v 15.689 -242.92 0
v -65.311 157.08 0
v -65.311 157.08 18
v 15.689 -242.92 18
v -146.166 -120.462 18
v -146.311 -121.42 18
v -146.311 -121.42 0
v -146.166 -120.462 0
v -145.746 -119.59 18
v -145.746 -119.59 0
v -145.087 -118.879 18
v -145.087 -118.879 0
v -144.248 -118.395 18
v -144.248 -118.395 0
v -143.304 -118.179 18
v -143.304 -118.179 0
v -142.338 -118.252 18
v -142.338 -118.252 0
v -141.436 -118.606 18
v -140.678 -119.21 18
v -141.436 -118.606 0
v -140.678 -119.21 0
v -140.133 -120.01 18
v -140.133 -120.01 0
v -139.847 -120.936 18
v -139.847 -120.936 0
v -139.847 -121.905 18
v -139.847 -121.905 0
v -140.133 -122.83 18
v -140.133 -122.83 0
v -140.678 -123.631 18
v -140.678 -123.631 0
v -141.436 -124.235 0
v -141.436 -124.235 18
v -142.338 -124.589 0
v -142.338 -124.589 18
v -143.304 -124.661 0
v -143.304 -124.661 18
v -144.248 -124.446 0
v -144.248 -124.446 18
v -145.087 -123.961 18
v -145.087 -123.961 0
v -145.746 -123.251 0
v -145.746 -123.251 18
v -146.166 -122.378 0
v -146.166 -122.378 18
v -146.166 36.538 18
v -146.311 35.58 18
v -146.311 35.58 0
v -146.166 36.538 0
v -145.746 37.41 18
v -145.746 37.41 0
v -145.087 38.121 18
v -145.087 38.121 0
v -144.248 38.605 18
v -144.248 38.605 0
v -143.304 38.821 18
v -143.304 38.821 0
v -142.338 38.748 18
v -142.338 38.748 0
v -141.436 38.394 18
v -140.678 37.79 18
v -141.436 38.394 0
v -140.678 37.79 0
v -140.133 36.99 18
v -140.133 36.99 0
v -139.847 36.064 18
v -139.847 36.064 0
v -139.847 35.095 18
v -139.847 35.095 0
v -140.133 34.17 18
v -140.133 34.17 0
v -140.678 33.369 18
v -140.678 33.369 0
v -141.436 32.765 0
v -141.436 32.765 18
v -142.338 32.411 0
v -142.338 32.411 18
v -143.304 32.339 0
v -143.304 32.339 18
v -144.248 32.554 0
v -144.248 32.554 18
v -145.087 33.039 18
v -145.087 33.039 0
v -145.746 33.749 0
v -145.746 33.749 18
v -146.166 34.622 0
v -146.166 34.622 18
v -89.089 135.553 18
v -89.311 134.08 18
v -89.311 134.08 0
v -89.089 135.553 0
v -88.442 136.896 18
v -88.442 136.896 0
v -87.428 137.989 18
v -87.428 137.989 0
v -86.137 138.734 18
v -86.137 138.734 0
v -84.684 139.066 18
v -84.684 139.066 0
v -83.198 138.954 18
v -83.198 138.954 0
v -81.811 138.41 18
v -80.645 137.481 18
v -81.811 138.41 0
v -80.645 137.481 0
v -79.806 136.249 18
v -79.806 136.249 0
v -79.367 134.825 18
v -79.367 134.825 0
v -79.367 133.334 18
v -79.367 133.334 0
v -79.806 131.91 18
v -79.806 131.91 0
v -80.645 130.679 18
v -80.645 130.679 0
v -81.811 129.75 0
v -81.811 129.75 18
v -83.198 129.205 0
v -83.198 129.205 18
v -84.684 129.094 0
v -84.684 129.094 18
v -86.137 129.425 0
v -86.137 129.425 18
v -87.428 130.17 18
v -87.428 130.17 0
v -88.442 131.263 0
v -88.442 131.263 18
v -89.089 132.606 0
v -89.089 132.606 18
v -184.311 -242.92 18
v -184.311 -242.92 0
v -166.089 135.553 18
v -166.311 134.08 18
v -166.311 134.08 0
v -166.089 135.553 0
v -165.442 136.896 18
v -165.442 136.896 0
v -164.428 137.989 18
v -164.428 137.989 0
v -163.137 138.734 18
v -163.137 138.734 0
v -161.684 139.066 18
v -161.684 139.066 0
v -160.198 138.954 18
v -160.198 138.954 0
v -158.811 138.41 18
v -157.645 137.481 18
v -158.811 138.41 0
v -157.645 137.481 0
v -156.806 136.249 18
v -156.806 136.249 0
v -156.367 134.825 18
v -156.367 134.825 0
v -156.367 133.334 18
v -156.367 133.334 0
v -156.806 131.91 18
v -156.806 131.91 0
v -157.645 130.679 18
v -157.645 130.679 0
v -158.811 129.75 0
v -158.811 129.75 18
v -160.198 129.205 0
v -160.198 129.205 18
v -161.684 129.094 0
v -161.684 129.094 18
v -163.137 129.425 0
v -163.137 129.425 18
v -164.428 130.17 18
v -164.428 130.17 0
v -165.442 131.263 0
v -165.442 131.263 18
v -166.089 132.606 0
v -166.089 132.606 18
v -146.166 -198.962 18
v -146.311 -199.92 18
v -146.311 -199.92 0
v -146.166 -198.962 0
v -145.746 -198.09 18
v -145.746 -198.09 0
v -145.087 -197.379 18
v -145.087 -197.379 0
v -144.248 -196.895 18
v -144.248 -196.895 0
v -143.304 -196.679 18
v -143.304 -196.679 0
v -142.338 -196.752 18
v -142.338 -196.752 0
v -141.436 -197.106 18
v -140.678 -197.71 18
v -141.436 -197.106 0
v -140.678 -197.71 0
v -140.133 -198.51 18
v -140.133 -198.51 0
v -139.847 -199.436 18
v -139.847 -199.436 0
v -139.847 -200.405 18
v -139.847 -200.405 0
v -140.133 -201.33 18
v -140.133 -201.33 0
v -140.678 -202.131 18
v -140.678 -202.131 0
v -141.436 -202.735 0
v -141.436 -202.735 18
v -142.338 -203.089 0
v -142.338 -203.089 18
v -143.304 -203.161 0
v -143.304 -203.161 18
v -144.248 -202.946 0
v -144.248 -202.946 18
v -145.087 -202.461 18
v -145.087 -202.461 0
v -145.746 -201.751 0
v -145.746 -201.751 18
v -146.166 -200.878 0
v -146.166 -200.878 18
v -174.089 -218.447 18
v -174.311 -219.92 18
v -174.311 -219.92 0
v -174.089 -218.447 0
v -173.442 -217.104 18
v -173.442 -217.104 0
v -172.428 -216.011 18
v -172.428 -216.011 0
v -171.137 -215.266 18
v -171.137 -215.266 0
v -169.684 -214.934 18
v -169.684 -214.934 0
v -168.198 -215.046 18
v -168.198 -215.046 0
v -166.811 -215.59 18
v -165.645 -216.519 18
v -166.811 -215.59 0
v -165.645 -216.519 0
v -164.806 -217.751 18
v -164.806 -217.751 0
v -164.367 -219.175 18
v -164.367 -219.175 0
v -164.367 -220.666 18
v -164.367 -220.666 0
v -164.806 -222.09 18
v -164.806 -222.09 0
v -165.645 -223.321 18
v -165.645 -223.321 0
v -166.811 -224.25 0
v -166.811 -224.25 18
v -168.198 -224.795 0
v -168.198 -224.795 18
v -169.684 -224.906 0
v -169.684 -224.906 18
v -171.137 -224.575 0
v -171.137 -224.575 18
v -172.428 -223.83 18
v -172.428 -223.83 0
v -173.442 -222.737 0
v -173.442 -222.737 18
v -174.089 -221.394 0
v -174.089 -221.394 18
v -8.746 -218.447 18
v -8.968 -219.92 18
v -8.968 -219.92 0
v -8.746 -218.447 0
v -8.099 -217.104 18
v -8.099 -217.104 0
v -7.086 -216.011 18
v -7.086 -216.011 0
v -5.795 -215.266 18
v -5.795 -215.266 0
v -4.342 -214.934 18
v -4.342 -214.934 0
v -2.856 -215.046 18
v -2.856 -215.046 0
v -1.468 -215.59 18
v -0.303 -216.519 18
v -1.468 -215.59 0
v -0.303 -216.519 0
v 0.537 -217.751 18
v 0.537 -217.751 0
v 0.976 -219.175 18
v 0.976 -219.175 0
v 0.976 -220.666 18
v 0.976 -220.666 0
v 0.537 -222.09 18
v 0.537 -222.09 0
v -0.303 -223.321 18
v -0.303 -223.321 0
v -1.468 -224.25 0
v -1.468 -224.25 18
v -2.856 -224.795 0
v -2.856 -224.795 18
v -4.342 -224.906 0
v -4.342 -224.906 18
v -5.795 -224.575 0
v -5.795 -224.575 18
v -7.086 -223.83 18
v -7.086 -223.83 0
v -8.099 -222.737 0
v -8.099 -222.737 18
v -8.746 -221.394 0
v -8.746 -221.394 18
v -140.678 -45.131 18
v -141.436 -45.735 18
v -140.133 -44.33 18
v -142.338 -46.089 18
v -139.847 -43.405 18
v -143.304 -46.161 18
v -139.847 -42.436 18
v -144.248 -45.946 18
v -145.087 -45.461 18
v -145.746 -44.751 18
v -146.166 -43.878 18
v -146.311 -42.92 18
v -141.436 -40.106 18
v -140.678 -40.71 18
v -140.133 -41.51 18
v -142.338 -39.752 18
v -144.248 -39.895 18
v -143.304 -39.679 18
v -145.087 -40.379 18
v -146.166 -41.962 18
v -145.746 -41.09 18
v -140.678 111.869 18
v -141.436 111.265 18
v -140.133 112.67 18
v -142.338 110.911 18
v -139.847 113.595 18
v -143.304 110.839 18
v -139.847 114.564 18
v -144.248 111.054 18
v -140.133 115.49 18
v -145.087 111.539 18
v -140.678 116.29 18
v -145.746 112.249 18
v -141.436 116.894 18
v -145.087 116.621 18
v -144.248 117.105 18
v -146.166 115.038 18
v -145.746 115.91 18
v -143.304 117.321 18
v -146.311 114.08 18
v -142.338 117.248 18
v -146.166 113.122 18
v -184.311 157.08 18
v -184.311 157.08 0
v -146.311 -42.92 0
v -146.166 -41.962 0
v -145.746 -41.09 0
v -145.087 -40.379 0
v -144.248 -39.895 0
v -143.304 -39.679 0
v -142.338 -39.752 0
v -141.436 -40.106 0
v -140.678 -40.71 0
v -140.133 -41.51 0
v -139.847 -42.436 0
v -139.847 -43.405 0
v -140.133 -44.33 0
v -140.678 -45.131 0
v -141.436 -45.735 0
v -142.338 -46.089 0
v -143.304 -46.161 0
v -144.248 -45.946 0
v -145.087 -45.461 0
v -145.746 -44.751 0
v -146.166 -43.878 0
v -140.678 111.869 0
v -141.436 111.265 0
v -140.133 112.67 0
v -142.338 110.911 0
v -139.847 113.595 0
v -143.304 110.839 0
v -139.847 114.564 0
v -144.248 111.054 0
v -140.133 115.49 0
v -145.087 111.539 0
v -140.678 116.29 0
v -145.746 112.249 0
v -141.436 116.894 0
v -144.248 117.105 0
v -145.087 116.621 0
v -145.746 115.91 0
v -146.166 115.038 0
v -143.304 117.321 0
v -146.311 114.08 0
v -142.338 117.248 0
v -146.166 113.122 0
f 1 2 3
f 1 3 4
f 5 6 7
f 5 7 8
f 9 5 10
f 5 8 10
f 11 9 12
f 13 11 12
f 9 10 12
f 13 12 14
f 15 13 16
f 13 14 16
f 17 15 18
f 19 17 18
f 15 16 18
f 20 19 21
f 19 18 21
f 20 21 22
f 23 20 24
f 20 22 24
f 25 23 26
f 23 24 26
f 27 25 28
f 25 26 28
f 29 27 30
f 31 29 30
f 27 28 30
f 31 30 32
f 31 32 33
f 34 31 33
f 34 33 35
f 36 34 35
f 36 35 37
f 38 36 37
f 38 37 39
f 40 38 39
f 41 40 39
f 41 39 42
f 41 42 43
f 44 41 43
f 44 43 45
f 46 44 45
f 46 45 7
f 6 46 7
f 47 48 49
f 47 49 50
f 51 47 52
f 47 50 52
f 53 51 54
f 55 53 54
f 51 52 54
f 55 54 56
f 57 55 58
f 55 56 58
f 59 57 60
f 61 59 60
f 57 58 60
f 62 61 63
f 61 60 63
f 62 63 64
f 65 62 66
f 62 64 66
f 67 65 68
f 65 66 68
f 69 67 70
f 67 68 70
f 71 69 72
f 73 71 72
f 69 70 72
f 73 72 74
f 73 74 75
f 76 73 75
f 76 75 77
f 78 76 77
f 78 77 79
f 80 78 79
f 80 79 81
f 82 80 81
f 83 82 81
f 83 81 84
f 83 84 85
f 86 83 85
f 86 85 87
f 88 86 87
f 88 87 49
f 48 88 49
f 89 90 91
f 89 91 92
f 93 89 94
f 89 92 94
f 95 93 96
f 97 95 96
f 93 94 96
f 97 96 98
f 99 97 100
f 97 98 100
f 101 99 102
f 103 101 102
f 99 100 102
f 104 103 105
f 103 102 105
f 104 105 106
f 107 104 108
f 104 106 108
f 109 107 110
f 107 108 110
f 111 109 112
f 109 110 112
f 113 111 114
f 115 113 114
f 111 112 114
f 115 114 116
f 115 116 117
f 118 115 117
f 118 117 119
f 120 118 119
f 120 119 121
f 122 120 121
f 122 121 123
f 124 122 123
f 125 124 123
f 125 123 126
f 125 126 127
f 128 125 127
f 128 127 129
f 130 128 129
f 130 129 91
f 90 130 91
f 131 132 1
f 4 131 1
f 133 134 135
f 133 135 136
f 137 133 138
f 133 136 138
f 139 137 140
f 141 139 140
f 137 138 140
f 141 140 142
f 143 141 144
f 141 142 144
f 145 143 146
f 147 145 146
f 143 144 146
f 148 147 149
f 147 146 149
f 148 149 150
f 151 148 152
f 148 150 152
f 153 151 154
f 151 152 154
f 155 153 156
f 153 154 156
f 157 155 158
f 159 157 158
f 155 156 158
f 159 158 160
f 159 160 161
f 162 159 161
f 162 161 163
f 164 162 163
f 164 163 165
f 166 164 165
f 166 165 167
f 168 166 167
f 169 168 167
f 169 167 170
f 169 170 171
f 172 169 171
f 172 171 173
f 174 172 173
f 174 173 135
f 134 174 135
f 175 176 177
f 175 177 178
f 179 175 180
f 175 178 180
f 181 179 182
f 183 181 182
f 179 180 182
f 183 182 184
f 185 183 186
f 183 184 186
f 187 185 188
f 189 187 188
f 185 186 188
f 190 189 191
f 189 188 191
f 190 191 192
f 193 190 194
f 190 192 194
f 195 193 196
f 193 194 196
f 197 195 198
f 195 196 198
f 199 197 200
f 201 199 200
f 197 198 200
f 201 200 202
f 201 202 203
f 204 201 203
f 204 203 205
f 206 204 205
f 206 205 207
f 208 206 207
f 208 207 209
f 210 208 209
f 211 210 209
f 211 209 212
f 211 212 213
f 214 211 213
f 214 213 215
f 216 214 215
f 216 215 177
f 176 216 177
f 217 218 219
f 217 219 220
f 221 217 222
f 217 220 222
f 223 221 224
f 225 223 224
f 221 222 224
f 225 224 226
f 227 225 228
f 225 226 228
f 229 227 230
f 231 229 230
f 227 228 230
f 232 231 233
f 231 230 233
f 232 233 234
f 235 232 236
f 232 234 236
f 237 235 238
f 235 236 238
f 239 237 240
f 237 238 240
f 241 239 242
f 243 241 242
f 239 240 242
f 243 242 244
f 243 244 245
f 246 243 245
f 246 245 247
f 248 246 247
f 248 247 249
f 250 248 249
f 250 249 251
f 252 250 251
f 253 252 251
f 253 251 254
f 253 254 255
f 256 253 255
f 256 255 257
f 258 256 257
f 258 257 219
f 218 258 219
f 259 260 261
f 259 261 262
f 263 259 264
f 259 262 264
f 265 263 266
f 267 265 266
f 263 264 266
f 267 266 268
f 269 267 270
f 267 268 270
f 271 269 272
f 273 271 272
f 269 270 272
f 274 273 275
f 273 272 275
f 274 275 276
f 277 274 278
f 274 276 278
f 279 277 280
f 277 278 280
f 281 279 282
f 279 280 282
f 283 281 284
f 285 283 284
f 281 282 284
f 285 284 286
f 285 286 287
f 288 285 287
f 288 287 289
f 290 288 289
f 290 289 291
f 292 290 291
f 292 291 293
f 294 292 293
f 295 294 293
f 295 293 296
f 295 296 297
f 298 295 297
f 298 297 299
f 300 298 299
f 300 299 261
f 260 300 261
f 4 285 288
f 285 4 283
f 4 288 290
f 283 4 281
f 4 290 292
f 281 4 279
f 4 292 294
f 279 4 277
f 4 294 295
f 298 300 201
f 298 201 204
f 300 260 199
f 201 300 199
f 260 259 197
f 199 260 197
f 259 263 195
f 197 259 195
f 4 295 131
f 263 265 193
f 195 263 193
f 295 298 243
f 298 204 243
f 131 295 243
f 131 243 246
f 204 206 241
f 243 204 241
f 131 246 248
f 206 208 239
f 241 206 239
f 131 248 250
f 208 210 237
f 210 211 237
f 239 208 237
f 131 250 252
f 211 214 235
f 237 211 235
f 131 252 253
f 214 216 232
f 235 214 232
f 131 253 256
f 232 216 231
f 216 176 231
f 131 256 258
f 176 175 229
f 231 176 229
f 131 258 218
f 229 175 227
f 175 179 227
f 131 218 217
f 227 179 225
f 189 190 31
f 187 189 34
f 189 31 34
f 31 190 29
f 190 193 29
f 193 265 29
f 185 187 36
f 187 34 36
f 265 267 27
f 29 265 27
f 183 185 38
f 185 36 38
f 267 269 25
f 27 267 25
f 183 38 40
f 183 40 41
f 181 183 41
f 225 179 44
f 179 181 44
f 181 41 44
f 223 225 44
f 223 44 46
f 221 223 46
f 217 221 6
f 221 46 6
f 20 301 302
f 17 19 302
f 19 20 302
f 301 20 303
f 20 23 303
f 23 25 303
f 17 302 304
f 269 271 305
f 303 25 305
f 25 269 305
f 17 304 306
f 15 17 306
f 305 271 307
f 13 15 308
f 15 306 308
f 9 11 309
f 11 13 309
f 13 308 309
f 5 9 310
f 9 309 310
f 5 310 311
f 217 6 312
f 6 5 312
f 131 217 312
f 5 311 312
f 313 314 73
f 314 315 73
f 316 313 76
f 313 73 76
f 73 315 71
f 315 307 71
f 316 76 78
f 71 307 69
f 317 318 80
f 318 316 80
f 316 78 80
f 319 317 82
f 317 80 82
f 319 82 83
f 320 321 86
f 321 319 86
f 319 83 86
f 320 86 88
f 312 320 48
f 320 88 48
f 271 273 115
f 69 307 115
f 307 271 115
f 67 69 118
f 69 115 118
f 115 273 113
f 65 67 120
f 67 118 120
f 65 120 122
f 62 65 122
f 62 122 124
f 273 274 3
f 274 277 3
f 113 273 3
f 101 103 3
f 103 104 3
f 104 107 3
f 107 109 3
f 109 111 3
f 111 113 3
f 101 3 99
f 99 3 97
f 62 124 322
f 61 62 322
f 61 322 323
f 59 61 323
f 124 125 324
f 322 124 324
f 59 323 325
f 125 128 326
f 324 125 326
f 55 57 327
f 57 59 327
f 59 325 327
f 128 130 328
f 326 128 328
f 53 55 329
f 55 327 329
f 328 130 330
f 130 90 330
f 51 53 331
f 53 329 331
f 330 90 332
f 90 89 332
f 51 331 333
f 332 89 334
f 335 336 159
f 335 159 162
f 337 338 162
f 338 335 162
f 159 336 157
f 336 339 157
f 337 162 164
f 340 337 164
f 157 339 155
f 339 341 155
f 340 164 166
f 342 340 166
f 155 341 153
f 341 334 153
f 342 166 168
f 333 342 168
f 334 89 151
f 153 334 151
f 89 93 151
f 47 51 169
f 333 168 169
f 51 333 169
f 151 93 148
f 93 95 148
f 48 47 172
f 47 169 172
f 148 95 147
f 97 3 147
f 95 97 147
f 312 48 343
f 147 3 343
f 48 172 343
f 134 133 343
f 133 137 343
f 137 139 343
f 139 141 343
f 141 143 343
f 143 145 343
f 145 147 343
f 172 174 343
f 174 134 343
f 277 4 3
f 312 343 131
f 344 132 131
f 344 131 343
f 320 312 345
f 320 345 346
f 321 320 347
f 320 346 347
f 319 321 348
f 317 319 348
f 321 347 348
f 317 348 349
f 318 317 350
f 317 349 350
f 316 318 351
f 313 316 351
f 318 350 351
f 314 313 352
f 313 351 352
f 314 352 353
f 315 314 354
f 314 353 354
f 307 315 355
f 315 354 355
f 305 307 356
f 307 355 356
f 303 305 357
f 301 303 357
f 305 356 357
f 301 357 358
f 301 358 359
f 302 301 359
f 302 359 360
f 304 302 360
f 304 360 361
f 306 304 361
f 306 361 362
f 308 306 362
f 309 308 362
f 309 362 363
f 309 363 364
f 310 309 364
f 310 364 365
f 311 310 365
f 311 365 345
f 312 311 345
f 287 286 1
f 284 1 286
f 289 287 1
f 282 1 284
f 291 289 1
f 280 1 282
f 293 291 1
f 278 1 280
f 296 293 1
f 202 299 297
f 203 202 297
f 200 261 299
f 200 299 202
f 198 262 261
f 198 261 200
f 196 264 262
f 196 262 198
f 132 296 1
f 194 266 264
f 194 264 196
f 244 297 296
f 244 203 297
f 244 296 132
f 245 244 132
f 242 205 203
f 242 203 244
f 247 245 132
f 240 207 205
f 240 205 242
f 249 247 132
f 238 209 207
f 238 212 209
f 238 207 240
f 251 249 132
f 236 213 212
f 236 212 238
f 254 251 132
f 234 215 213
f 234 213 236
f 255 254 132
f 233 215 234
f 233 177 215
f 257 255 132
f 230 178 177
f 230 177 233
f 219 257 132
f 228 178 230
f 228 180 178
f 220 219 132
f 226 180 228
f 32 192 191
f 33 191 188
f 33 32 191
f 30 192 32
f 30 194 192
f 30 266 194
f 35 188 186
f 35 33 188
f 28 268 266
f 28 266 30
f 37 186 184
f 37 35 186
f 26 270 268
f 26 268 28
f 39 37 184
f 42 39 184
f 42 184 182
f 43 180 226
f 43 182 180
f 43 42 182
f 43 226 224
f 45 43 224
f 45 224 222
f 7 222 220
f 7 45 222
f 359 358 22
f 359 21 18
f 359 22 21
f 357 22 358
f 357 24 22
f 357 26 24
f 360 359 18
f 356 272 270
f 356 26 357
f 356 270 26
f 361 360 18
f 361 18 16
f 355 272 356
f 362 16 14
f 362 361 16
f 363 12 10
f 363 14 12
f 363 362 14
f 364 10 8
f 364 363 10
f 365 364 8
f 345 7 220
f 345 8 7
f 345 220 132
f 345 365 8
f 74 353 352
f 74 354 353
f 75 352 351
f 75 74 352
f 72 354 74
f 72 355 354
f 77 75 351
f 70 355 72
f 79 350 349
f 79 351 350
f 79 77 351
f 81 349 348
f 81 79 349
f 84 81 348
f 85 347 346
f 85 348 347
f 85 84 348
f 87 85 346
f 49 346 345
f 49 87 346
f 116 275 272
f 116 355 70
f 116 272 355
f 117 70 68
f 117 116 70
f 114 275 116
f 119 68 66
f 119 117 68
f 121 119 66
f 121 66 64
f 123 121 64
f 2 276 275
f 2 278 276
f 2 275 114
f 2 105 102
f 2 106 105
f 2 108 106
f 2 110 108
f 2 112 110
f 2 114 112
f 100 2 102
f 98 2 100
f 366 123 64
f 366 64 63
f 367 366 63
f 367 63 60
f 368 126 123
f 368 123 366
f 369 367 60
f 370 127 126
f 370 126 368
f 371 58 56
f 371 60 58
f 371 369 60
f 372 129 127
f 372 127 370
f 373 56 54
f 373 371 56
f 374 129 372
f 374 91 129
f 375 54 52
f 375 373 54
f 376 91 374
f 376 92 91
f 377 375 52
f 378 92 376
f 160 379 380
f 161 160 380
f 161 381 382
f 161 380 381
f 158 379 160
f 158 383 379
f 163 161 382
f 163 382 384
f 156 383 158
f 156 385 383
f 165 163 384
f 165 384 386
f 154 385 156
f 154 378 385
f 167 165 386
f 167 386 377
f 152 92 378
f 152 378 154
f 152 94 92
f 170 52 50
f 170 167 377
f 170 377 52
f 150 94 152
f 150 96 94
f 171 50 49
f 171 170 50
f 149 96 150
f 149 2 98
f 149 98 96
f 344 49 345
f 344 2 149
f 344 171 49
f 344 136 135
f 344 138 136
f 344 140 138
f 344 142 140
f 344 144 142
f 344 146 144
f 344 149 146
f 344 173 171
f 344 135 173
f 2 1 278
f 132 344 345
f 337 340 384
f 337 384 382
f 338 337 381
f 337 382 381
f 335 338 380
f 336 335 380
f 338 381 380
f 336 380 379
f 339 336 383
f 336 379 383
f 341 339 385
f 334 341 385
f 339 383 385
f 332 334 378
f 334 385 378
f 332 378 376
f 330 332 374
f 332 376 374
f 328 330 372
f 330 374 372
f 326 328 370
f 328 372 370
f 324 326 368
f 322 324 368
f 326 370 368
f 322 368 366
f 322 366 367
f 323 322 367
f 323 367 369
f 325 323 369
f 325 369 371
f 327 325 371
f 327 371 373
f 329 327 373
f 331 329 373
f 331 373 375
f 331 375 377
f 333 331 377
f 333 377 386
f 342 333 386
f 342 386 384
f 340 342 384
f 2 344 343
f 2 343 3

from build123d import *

# Parameters (mm, degrees)
BOSS_EXTRUDE1_DEPTH = 18
SKETCH2_R           = 5
SKETCH2_R_2         = 3.25
CUT_EXTRUDE1_DEPTH  = 19


with BuildPart() as part:
    # Sketch1 → Boss-Extrude1 (new body)
    with BuildSketch(Plane.XY):
        Polygon((-65.310735067, 157.079646018), (15.689264933, -242.920353982), (-65.310735067, -242.920353982), (-184.310735067, -242.920353982), (-184.310735067, 157.079646018), align=None)
    extrude(amount=BOSS_EXTRUDE1_DEPTH)

    # Sketch2 → Cut-Extrude1 (cut, through all)
    with BuildSketch(Plane(origin=(0, 0, 0), x_dir=(-1, 0, 0), z_dir=(0, 0, -1))):
        with Locations((84.310735067, 134.079646018)):
            Circle(SKETCH2_R)
        with Locations((161.310735067, 134.079646018)):
            Circle(SKETCH2_R)
        with Locations((143.060735067, 114.079646018)):
            Circle(SKETCH2_R_2)
        with Locations((143.060735067, 35.579646018)):
            Circle(SKETCH2_R_2)
        with Locations((143.060735067, -42.920353982)):
            Circle(SKETCH2_R_2)
        with Locations((143.060735067, -121.420353982)):
            Circle(SKETCH2_R_2)
        with Locations((143.060735067, -199.920353982)):
            Circle(SKETCH2_R_2)
        with Locations((169.310735067, -219.920353982)):
            Circle(SKETCH2_R)
        with Locations((3.968235067, -219.920353982)):
            Circle(SKETCH2_R)
    extrude(amount=-CUT_EXTRUDE1_DEPTH, mode=Mode.SUBTRACT)


solid = part.part
